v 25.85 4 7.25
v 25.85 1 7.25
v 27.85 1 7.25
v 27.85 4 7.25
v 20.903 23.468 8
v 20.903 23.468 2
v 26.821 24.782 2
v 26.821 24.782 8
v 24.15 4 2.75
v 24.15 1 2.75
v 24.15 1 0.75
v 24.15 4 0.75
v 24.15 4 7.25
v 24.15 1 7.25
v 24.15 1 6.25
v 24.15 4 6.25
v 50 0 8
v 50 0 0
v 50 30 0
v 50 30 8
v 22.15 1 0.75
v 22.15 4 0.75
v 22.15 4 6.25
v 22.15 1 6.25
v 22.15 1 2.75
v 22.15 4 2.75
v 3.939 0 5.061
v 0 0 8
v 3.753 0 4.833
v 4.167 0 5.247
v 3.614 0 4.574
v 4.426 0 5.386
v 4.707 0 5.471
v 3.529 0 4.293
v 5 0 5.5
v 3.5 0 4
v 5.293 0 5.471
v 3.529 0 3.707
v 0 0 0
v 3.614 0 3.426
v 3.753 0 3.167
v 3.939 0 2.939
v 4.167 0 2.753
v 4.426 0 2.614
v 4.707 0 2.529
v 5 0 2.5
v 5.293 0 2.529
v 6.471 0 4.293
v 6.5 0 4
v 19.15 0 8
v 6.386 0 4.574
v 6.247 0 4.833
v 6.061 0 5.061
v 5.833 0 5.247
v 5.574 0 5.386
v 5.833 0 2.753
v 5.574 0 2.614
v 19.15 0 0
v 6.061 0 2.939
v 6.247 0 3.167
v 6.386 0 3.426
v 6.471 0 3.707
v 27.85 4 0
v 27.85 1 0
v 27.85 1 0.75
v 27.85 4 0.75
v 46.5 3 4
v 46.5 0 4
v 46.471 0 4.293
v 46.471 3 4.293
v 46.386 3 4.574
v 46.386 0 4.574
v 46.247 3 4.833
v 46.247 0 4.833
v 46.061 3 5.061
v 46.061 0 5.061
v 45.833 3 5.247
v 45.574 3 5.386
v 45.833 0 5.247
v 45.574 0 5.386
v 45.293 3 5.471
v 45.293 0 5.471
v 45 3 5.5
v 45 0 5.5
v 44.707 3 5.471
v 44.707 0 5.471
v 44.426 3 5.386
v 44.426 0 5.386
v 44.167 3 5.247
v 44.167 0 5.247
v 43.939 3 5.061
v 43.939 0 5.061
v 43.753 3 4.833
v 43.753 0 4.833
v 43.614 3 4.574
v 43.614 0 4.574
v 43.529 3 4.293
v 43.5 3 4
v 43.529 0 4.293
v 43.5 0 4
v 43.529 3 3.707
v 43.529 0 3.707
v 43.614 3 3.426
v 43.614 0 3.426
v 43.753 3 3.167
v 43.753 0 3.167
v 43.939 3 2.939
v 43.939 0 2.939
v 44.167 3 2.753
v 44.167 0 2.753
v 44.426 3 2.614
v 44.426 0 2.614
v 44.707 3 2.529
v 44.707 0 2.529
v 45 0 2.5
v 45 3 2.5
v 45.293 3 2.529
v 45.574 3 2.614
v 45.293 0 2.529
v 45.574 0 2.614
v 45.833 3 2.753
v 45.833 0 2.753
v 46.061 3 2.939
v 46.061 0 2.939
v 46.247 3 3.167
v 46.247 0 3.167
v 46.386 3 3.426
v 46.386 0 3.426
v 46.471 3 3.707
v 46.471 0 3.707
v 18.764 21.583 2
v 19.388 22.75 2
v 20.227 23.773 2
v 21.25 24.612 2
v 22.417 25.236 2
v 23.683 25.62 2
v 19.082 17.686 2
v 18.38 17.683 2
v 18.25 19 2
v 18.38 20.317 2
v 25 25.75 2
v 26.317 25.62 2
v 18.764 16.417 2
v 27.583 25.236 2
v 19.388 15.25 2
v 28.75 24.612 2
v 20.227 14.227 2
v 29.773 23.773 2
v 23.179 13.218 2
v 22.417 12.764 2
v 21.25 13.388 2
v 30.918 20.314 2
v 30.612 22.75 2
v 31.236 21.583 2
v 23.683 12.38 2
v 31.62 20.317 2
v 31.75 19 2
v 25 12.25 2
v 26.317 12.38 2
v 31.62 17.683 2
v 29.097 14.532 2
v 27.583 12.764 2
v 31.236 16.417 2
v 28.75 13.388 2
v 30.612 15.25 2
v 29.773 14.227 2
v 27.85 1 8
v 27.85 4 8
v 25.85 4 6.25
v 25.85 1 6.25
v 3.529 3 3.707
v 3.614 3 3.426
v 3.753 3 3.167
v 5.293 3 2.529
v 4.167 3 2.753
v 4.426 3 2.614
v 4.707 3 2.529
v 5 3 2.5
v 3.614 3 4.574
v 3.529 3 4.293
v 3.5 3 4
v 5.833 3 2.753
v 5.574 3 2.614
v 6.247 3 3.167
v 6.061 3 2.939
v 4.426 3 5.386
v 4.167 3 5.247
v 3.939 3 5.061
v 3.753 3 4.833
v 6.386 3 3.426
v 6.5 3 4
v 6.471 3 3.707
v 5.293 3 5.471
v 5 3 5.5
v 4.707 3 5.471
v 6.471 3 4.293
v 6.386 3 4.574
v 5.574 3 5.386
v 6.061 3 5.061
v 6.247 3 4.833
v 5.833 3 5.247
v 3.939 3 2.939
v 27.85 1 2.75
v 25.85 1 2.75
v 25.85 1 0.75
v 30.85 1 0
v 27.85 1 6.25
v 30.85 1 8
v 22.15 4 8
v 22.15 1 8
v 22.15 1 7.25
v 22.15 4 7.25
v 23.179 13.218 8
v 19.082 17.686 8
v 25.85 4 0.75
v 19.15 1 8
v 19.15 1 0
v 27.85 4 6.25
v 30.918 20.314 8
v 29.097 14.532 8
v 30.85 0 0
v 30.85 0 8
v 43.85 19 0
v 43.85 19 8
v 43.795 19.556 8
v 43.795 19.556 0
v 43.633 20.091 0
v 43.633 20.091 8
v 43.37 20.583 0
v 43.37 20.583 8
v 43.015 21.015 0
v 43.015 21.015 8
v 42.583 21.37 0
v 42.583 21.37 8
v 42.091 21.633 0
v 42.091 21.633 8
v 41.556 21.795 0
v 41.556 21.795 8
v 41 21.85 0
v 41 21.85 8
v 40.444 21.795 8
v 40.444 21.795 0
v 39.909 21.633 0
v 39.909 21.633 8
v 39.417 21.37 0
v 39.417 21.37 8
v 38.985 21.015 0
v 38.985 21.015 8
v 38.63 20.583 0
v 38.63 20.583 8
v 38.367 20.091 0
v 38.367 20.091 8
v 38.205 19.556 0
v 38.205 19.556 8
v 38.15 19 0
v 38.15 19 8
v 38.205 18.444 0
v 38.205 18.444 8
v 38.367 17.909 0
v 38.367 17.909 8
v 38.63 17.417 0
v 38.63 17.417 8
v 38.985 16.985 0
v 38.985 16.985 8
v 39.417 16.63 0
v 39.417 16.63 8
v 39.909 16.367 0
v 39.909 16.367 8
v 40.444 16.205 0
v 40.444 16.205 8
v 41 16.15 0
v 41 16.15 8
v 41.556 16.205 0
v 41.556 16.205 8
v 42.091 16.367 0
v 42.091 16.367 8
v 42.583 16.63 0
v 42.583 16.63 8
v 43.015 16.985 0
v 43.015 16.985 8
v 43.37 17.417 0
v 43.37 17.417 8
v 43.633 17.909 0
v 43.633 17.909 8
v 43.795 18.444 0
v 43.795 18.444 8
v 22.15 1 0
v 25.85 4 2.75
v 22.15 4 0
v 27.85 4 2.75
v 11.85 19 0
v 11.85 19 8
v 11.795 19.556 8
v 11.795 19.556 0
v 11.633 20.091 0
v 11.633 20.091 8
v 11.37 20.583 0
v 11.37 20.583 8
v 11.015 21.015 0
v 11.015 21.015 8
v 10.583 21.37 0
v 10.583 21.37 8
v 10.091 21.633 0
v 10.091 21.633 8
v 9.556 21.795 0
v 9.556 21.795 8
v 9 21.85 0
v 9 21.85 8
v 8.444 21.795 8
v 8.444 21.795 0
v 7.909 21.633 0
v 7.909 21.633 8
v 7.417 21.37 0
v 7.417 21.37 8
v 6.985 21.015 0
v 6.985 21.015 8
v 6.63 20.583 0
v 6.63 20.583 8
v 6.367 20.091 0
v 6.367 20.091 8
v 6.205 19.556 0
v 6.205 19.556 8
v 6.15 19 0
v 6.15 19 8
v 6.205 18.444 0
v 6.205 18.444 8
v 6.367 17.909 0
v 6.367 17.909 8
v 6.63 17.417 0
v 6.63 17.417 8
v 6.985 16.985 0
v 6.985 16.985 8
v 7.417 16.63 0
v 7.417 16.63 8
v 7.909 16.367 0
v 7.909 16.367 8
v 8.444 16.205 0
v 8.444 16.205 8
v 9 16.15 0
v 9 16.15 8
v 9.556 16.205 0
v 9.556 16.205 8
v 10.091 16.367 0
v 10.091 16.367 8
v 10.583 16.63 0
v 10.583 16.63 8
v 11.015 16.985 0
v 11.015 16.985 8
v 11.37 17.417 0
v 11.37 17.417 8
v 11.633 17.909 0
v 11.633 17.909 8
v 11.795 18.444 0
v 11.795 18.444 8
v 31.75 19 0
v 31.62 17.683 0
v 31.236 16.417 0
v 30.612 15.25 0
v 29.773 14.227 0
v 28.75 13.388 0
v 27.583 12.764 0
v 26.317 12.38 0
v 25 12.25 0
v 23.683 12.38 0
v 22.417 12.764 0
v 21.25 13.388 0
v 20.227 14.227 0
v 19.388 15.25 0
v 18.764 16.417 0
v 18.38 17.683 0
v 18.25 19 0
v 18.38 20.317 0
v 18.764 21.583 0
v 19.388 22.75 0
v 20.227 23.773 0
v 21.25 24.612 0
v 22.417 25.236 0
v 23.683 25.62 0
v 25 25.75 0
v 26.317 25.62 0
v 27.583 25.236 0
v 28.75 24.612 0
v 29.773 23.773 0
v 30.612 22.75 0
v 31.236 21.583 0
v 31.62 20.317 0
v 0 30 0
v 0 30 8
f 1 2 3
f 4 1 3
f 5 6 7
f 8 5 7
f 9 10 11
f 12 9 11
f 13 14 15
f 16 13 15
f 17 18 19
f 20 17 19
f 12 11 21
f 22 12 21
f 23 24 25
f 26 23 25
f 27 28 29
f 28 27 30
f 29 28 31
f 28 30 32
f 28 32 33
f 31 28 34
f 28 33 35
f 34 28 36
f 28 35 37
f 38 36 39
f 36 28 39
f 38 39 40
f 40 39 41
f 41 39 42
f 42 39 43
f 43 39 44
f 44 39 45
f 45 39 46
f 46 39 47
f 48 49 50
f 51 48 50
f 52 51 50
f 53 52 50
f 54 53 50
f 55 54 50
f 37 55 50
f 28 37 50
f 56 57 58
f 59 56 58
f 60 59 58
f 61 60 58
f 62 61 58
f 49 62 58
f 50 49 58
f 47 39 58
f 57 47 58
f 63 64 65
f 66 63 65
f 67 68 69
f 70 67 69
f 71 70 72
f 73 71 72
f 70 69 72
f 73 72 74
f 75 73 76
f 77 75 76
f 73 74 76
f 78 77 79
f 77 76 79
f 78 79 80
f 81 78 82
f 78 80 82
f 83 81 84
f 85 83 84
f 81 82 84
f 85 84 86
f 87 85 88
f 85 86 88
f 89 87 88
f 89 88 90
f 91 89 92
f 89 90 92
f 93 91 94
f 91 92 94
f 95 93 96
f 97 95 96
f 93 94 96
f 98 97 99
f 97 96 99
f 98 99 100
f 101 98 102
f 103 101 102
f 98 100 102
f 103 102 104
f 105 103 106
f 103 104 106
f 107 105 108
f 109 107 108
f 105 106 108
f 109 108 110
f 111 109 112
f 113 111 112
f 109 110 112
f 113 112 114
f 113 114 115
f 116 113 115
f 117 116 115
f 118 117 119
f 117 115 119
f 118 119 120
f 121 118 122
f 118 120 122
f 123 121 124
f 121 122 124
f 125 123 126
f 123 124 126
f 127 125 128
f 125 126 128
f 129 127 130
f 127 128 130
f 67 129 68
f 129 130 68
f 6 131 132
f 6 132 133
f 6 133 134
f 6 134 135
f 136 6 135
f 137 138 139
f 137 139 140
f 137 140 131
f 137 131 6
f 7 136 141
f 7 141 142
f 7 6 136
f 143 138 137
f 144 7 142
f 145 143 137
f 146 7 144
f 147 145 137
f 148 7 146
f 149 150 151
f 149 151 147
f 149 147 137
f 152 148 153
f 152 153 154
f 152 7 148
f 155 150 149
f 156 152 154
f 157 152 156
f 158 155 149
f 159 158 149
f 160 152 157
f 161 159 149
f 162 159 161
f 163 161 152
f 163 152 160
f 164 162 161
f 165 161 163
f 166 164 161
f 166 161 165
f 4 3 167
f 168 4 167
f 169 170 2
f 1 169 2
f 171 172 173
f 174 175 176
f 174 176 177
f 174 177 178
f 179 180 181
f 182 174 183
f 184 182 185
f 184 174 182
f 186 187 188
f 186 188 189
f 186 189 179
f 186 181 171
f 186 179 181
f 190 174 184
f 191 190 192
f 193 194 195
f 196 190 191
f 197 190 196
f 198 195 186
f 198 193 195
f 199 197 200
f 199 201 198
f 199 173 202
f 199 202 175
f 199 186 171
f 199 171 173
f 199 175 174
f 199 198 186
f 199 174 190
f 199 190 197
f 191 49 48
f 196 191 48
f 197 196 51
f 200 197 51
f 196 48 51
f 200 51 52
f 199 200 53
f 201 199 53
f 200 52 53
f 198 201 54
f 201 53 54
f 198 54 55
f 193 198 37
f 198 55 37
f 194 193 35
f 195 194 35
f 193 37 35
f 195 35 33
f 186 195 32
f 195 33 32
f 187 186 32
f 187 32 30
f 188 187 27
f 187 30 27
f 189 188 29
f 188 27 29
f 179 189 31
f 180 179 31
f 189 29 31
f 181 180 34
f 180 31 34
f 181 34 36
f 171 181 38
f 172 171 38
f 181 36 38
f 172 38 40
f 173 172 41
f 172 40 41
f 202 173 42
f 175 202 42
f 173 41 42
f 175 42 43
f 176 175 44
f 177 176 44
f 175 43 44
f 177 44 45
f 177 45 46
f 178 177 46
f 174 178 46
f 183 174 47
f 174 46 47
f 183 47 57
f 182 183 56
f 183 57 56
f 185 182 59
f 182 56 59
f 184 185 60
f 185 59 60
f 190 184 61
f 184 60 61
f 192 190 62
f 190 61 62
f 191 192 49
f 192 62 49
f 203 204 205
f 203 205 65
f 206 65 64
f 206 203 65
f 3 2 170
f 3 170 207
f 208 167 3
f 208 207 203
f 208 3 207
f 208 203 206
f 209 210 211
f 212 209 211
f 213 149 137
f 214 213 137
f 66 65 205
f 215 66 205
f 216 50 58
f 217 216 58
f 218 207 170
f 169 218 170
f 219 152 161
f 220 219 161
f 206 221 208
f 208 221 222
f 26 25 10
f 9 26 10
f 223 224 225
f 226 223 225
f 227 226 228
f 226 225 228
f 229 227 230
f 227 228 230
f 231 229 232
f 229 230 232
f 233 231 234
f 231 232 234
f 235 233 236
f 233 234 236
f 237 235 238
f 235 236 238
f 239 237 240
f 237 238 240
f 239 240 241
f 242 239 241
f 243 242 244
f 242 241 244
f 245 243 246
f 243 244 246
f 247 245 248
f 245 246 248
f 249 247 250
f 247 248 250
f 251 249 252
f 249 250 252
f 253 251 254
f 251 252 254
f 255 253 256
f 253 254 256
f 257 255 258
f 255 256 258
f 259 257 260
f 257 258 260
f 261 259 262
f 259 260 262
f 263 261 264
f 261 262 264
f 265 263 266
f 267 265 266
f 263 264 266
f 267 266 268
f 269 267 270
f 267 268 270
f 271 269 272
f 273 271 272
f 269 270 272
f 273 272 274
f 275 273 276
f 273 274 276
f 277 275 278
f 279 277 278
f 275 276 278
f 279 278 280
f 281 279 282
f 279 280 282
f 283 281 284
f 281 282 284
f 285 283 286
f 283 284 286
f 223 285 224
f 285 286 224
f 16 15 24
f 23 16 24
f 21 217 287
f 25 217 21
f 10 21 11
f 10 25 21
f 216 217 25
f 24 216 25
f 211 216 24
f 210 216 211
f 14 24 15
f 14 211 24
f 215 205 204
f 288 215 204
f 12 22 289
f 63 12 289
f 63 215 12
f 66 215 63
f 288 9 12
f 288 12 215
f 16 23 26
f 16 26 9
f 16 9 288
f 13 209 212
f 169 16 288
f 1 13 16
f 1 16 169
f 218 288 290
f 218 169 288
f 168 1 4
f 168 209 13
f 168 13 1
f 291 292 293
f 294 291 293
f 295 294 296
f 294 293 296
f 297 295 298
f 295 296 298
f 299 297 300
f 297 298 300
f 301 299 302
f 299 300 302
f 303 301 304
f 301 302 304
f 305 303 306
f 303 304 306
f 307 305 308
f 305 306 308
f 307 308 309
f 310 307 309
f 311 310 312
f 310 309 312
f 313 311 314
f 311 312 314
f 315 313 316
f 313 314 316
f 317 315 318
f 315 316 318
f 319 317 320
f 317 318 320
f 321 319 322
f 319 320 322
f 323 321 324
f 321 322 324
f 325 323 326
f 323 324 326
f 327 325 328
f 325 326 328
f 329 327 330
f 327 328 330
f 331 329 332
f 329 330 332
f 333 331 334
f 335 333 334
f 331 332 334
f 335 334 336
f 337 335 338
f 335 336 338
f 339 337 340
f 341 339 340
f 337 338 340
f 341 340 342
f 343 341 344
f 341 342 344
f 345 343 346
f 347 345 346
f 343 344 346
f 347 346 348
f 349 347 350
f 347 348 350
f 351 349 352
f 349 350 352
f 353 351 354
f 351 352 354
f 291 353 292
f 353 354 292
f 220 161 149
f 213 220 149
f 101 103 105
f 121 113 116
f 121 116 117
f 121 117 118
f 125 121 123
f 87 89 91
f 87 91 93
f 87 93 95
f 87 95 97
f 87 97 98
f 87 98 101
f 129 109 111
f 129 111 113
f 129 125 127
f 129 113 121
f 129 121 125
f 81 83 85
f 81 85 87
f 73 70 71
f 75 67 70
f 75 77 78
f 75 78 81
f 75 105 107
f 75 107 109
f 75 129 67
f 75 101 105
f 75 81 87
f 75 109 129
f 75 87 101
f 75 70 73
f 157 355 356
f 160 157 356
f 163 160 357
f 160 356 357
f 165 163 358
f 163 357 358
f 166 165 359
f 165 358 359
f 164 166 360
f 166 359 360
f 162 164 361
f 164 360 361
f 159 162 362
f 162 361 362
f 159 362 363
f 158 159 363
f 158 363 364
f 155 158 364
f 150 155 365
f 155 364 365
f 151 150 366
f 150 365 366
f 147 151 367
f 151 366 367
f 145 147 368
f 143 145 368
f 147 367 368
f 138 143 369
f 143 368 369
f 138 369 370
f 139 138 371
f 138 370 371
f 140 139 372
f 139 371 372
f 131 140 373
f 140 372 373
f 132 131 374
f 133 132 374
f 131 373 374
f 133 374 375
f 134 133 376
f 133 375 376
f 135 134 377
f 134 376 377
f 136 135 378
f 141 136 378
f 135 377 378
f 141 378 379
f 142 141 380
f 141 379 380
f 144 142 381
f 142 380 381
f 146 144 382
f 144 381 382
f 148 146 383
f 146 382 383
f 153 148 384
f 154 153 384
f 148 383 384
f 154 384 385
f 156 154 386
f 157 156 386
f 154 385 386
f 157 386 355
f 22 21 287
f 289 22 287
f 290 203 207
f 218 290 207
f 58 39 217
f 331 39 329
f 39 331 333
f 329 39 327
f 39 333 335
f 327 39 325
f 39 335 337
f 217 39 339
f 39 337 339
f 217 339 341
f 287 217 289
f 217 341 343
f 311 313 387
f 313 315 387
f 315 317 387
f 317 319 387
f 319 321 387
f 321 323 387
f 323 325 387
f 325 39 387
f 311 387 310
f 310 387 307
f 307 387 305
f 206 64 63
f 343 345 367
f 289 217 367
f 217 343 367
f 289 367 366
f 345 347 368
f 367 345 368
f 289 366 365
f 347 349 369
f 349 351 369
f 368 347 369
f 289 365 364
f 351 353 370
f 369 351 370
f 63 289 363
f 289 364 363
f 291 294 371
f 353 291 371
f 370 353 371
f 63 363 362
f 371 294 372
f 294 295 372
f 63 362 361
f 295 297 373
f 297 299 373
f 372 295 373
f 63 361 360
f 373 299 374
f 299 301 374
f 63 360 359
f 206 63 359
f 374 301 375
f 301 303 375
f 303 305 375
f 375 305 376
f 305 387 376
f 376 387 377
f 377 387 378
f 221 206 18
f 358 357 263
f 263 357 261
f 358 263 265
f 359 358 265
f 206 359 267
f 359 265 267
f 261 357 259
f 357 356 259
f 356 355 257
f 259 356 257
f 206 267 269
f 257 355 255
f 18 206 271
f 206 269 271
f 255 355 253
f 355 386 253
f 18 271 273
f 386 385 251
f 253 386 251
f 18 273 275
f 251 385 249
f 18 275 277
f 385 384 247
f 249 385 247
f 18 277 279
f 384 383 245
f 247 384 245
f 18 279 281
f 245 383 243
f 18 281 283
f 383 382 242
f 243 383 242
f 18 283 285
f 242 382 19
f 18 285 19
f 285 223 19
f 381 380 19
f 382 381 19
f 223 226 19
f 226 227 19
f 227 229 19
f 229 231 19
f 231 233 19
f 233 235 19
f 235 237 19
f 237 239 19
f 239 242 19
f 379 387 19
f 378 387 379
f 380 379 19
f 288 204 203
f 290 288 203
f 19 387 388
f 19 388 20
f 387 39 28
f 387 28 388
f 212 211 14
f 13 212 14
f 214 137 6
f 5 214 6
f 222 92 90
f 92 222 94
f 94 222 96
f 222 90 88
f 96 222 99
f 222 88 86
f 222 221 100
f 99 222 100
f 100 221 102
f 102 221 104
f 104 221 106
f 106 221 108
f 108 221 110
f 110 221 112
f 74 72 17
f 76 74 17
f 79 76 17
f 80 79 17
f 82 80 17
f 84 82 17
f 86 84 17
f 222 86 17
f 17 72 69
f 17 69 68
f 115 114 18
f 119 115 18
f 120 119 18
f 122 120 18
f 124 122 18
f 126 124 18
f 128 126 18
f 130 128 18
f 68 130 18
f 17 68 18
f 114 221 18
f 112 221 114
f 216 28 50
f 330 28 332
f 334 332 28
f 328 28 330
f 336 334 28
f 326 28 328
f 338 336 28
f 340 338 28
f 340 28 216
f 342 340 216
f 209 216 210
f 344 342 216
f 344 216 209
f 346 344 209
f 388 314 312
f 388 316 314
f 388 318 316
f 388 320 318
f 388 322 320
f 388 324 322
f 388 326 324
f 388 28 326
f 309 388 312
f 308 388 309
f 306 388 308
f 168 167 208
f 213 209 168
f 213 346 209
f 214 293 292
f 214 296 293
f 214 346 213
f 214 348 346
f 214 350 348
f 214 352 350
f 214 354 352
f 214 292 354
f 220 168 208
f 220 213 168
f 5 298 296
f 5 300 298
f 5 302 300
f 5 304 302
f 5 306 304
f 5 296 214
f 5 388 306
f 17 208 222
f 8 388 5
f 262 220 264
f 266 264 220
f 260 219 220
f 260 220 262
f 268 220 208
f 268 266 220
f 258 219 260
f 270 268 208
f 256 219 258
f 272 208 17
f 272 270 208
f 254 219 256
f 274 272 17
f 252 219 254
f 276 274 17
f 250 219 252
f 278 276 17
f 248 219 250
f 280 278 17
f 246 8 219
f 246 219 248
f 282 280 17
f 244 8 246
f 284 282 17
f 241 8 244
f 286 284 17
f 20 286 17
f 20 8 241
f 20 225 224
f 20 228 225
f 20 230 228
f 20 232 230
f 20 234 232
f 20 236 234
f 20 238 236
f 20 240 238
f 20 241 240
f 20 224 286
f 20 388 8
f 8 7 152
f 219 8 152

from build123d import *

# Parameters (mm, degrees)
F0_W      = 50
F0_H      = 30
F1_DEPTH  = 8
F2_R      = 2.85
F3_DEPTH  = 8
F4_R      = 1.5
F5_DEPTH  = 3
F6_DEPTH  = 4
F7_DEPTH  = 1
F8_R      = 6.75
F9_DEPTH  = 2
F11_DEPTH = 6


with BuildPart() as f1:
    # F0 (on Top) → F1 (new body)
    with BuildSketch(Plane.XY):
        with Locations((25, 15)):
            Rectangle(F0_W, F0_H)
    extrude(amount=F1_DEPTH)

    # F2 (on face) → F3 (cut)
    with BuildSketch(Plane.XY.offset(8)):
        with Locations((41, 19)):
            Circle(F2_R)
        with Locations((9, 19)):
            Circle(F2_R)
    extrude(amount=-F3_DEPTH, mode=Mode.SUBTRACT)

    # F4 (on face) → F5 (cut)
    with BuildSketch(Plane.XZ):
        with Locations((5, 4)):
            Circle(F4_R)
        with Locations((45, 4)):
            Circle(F4_R)
    extrude(amount=-F5_DEPTH, mode=Mode.SUBTRACT)

    # F4 (on face) → F6 (cut)
    with BuildSketch(Plane.XZ):
        Polygon((22.15, 0.75), (22.15, 0), (27.85, 0), (27.85, 0.75), (25.85, 0.75), (25.85, 2.75), (27.85, 2.75), (27.85, 6.25), (25.85, 6.25), (25.85, 7.25), (27.85, 7.25), (27.85, 8), (22.15, 8), (22.15, 7.25), (24.15, 7.25), (24.15, 6.25), (22.15, 6.25), (22.15, 2.75), (24.15, 2.75), (24.15, 0.75), align=None)
    extrude(amount=-F6_DEPTH, mode=Mode.SUBTRACT)

    # F4 (on face) → F7 (cut)
    with BuildSketch(Plane.XZ):
        Polygon((19.15, 8), (19.15, 0), (22.15, 0), (22.15, 0.75), (24.15, 0.75), (24.15, 2.75), (22.15, 2.75), (22.15, 6.25), (24.15, 6.25), (24.15, 7.25), (22.15, 7.25), (22.15, 8), align=None)
        Polygon((27.85, 0.75), (27.85, 0), (30.85, 0), (30.85, 8), (27.85, 8), (27.85, 7.25), (25.85, 7.25), (25.85, 6.25), (27.85, 6.25), (27.85, 2.75), (25.85, 2.75), (25.85, 0.75), align=None)
    extrude(amount=-F7_DEPTH, mode=Mode.SUBTRACT)

    # F8 (on face) → F9 (cut)
    with BuildSketch(Plane(origin=(0, 0, 0), x_dir=(1, 0, 0), z_dir=(0, 0, -1))):
        with Locations((25, -19)):
            Circle(F8_R)
    extrude(amount=-F9_DEPTH, mode=Mode.SUBTRACT)

    # F10 (on face) → F11 (cut)
    with BuildSketch(Plane(origin=(0, 0, 2), x_dir=(1, 0, 0), z_dir=(0, 0, -1))):
        Polygon((30.918031, -20.31412), (29.097077, -14.531895), (23.179046, -13.217775), (19.081969, -17.68588), (20.902923, -23.468105), (26.820954, -24.782225), align=None)
    extrude(amount=-F11_DEPTH, mode=Mode.SUBTRACT)


solid = f1.part
